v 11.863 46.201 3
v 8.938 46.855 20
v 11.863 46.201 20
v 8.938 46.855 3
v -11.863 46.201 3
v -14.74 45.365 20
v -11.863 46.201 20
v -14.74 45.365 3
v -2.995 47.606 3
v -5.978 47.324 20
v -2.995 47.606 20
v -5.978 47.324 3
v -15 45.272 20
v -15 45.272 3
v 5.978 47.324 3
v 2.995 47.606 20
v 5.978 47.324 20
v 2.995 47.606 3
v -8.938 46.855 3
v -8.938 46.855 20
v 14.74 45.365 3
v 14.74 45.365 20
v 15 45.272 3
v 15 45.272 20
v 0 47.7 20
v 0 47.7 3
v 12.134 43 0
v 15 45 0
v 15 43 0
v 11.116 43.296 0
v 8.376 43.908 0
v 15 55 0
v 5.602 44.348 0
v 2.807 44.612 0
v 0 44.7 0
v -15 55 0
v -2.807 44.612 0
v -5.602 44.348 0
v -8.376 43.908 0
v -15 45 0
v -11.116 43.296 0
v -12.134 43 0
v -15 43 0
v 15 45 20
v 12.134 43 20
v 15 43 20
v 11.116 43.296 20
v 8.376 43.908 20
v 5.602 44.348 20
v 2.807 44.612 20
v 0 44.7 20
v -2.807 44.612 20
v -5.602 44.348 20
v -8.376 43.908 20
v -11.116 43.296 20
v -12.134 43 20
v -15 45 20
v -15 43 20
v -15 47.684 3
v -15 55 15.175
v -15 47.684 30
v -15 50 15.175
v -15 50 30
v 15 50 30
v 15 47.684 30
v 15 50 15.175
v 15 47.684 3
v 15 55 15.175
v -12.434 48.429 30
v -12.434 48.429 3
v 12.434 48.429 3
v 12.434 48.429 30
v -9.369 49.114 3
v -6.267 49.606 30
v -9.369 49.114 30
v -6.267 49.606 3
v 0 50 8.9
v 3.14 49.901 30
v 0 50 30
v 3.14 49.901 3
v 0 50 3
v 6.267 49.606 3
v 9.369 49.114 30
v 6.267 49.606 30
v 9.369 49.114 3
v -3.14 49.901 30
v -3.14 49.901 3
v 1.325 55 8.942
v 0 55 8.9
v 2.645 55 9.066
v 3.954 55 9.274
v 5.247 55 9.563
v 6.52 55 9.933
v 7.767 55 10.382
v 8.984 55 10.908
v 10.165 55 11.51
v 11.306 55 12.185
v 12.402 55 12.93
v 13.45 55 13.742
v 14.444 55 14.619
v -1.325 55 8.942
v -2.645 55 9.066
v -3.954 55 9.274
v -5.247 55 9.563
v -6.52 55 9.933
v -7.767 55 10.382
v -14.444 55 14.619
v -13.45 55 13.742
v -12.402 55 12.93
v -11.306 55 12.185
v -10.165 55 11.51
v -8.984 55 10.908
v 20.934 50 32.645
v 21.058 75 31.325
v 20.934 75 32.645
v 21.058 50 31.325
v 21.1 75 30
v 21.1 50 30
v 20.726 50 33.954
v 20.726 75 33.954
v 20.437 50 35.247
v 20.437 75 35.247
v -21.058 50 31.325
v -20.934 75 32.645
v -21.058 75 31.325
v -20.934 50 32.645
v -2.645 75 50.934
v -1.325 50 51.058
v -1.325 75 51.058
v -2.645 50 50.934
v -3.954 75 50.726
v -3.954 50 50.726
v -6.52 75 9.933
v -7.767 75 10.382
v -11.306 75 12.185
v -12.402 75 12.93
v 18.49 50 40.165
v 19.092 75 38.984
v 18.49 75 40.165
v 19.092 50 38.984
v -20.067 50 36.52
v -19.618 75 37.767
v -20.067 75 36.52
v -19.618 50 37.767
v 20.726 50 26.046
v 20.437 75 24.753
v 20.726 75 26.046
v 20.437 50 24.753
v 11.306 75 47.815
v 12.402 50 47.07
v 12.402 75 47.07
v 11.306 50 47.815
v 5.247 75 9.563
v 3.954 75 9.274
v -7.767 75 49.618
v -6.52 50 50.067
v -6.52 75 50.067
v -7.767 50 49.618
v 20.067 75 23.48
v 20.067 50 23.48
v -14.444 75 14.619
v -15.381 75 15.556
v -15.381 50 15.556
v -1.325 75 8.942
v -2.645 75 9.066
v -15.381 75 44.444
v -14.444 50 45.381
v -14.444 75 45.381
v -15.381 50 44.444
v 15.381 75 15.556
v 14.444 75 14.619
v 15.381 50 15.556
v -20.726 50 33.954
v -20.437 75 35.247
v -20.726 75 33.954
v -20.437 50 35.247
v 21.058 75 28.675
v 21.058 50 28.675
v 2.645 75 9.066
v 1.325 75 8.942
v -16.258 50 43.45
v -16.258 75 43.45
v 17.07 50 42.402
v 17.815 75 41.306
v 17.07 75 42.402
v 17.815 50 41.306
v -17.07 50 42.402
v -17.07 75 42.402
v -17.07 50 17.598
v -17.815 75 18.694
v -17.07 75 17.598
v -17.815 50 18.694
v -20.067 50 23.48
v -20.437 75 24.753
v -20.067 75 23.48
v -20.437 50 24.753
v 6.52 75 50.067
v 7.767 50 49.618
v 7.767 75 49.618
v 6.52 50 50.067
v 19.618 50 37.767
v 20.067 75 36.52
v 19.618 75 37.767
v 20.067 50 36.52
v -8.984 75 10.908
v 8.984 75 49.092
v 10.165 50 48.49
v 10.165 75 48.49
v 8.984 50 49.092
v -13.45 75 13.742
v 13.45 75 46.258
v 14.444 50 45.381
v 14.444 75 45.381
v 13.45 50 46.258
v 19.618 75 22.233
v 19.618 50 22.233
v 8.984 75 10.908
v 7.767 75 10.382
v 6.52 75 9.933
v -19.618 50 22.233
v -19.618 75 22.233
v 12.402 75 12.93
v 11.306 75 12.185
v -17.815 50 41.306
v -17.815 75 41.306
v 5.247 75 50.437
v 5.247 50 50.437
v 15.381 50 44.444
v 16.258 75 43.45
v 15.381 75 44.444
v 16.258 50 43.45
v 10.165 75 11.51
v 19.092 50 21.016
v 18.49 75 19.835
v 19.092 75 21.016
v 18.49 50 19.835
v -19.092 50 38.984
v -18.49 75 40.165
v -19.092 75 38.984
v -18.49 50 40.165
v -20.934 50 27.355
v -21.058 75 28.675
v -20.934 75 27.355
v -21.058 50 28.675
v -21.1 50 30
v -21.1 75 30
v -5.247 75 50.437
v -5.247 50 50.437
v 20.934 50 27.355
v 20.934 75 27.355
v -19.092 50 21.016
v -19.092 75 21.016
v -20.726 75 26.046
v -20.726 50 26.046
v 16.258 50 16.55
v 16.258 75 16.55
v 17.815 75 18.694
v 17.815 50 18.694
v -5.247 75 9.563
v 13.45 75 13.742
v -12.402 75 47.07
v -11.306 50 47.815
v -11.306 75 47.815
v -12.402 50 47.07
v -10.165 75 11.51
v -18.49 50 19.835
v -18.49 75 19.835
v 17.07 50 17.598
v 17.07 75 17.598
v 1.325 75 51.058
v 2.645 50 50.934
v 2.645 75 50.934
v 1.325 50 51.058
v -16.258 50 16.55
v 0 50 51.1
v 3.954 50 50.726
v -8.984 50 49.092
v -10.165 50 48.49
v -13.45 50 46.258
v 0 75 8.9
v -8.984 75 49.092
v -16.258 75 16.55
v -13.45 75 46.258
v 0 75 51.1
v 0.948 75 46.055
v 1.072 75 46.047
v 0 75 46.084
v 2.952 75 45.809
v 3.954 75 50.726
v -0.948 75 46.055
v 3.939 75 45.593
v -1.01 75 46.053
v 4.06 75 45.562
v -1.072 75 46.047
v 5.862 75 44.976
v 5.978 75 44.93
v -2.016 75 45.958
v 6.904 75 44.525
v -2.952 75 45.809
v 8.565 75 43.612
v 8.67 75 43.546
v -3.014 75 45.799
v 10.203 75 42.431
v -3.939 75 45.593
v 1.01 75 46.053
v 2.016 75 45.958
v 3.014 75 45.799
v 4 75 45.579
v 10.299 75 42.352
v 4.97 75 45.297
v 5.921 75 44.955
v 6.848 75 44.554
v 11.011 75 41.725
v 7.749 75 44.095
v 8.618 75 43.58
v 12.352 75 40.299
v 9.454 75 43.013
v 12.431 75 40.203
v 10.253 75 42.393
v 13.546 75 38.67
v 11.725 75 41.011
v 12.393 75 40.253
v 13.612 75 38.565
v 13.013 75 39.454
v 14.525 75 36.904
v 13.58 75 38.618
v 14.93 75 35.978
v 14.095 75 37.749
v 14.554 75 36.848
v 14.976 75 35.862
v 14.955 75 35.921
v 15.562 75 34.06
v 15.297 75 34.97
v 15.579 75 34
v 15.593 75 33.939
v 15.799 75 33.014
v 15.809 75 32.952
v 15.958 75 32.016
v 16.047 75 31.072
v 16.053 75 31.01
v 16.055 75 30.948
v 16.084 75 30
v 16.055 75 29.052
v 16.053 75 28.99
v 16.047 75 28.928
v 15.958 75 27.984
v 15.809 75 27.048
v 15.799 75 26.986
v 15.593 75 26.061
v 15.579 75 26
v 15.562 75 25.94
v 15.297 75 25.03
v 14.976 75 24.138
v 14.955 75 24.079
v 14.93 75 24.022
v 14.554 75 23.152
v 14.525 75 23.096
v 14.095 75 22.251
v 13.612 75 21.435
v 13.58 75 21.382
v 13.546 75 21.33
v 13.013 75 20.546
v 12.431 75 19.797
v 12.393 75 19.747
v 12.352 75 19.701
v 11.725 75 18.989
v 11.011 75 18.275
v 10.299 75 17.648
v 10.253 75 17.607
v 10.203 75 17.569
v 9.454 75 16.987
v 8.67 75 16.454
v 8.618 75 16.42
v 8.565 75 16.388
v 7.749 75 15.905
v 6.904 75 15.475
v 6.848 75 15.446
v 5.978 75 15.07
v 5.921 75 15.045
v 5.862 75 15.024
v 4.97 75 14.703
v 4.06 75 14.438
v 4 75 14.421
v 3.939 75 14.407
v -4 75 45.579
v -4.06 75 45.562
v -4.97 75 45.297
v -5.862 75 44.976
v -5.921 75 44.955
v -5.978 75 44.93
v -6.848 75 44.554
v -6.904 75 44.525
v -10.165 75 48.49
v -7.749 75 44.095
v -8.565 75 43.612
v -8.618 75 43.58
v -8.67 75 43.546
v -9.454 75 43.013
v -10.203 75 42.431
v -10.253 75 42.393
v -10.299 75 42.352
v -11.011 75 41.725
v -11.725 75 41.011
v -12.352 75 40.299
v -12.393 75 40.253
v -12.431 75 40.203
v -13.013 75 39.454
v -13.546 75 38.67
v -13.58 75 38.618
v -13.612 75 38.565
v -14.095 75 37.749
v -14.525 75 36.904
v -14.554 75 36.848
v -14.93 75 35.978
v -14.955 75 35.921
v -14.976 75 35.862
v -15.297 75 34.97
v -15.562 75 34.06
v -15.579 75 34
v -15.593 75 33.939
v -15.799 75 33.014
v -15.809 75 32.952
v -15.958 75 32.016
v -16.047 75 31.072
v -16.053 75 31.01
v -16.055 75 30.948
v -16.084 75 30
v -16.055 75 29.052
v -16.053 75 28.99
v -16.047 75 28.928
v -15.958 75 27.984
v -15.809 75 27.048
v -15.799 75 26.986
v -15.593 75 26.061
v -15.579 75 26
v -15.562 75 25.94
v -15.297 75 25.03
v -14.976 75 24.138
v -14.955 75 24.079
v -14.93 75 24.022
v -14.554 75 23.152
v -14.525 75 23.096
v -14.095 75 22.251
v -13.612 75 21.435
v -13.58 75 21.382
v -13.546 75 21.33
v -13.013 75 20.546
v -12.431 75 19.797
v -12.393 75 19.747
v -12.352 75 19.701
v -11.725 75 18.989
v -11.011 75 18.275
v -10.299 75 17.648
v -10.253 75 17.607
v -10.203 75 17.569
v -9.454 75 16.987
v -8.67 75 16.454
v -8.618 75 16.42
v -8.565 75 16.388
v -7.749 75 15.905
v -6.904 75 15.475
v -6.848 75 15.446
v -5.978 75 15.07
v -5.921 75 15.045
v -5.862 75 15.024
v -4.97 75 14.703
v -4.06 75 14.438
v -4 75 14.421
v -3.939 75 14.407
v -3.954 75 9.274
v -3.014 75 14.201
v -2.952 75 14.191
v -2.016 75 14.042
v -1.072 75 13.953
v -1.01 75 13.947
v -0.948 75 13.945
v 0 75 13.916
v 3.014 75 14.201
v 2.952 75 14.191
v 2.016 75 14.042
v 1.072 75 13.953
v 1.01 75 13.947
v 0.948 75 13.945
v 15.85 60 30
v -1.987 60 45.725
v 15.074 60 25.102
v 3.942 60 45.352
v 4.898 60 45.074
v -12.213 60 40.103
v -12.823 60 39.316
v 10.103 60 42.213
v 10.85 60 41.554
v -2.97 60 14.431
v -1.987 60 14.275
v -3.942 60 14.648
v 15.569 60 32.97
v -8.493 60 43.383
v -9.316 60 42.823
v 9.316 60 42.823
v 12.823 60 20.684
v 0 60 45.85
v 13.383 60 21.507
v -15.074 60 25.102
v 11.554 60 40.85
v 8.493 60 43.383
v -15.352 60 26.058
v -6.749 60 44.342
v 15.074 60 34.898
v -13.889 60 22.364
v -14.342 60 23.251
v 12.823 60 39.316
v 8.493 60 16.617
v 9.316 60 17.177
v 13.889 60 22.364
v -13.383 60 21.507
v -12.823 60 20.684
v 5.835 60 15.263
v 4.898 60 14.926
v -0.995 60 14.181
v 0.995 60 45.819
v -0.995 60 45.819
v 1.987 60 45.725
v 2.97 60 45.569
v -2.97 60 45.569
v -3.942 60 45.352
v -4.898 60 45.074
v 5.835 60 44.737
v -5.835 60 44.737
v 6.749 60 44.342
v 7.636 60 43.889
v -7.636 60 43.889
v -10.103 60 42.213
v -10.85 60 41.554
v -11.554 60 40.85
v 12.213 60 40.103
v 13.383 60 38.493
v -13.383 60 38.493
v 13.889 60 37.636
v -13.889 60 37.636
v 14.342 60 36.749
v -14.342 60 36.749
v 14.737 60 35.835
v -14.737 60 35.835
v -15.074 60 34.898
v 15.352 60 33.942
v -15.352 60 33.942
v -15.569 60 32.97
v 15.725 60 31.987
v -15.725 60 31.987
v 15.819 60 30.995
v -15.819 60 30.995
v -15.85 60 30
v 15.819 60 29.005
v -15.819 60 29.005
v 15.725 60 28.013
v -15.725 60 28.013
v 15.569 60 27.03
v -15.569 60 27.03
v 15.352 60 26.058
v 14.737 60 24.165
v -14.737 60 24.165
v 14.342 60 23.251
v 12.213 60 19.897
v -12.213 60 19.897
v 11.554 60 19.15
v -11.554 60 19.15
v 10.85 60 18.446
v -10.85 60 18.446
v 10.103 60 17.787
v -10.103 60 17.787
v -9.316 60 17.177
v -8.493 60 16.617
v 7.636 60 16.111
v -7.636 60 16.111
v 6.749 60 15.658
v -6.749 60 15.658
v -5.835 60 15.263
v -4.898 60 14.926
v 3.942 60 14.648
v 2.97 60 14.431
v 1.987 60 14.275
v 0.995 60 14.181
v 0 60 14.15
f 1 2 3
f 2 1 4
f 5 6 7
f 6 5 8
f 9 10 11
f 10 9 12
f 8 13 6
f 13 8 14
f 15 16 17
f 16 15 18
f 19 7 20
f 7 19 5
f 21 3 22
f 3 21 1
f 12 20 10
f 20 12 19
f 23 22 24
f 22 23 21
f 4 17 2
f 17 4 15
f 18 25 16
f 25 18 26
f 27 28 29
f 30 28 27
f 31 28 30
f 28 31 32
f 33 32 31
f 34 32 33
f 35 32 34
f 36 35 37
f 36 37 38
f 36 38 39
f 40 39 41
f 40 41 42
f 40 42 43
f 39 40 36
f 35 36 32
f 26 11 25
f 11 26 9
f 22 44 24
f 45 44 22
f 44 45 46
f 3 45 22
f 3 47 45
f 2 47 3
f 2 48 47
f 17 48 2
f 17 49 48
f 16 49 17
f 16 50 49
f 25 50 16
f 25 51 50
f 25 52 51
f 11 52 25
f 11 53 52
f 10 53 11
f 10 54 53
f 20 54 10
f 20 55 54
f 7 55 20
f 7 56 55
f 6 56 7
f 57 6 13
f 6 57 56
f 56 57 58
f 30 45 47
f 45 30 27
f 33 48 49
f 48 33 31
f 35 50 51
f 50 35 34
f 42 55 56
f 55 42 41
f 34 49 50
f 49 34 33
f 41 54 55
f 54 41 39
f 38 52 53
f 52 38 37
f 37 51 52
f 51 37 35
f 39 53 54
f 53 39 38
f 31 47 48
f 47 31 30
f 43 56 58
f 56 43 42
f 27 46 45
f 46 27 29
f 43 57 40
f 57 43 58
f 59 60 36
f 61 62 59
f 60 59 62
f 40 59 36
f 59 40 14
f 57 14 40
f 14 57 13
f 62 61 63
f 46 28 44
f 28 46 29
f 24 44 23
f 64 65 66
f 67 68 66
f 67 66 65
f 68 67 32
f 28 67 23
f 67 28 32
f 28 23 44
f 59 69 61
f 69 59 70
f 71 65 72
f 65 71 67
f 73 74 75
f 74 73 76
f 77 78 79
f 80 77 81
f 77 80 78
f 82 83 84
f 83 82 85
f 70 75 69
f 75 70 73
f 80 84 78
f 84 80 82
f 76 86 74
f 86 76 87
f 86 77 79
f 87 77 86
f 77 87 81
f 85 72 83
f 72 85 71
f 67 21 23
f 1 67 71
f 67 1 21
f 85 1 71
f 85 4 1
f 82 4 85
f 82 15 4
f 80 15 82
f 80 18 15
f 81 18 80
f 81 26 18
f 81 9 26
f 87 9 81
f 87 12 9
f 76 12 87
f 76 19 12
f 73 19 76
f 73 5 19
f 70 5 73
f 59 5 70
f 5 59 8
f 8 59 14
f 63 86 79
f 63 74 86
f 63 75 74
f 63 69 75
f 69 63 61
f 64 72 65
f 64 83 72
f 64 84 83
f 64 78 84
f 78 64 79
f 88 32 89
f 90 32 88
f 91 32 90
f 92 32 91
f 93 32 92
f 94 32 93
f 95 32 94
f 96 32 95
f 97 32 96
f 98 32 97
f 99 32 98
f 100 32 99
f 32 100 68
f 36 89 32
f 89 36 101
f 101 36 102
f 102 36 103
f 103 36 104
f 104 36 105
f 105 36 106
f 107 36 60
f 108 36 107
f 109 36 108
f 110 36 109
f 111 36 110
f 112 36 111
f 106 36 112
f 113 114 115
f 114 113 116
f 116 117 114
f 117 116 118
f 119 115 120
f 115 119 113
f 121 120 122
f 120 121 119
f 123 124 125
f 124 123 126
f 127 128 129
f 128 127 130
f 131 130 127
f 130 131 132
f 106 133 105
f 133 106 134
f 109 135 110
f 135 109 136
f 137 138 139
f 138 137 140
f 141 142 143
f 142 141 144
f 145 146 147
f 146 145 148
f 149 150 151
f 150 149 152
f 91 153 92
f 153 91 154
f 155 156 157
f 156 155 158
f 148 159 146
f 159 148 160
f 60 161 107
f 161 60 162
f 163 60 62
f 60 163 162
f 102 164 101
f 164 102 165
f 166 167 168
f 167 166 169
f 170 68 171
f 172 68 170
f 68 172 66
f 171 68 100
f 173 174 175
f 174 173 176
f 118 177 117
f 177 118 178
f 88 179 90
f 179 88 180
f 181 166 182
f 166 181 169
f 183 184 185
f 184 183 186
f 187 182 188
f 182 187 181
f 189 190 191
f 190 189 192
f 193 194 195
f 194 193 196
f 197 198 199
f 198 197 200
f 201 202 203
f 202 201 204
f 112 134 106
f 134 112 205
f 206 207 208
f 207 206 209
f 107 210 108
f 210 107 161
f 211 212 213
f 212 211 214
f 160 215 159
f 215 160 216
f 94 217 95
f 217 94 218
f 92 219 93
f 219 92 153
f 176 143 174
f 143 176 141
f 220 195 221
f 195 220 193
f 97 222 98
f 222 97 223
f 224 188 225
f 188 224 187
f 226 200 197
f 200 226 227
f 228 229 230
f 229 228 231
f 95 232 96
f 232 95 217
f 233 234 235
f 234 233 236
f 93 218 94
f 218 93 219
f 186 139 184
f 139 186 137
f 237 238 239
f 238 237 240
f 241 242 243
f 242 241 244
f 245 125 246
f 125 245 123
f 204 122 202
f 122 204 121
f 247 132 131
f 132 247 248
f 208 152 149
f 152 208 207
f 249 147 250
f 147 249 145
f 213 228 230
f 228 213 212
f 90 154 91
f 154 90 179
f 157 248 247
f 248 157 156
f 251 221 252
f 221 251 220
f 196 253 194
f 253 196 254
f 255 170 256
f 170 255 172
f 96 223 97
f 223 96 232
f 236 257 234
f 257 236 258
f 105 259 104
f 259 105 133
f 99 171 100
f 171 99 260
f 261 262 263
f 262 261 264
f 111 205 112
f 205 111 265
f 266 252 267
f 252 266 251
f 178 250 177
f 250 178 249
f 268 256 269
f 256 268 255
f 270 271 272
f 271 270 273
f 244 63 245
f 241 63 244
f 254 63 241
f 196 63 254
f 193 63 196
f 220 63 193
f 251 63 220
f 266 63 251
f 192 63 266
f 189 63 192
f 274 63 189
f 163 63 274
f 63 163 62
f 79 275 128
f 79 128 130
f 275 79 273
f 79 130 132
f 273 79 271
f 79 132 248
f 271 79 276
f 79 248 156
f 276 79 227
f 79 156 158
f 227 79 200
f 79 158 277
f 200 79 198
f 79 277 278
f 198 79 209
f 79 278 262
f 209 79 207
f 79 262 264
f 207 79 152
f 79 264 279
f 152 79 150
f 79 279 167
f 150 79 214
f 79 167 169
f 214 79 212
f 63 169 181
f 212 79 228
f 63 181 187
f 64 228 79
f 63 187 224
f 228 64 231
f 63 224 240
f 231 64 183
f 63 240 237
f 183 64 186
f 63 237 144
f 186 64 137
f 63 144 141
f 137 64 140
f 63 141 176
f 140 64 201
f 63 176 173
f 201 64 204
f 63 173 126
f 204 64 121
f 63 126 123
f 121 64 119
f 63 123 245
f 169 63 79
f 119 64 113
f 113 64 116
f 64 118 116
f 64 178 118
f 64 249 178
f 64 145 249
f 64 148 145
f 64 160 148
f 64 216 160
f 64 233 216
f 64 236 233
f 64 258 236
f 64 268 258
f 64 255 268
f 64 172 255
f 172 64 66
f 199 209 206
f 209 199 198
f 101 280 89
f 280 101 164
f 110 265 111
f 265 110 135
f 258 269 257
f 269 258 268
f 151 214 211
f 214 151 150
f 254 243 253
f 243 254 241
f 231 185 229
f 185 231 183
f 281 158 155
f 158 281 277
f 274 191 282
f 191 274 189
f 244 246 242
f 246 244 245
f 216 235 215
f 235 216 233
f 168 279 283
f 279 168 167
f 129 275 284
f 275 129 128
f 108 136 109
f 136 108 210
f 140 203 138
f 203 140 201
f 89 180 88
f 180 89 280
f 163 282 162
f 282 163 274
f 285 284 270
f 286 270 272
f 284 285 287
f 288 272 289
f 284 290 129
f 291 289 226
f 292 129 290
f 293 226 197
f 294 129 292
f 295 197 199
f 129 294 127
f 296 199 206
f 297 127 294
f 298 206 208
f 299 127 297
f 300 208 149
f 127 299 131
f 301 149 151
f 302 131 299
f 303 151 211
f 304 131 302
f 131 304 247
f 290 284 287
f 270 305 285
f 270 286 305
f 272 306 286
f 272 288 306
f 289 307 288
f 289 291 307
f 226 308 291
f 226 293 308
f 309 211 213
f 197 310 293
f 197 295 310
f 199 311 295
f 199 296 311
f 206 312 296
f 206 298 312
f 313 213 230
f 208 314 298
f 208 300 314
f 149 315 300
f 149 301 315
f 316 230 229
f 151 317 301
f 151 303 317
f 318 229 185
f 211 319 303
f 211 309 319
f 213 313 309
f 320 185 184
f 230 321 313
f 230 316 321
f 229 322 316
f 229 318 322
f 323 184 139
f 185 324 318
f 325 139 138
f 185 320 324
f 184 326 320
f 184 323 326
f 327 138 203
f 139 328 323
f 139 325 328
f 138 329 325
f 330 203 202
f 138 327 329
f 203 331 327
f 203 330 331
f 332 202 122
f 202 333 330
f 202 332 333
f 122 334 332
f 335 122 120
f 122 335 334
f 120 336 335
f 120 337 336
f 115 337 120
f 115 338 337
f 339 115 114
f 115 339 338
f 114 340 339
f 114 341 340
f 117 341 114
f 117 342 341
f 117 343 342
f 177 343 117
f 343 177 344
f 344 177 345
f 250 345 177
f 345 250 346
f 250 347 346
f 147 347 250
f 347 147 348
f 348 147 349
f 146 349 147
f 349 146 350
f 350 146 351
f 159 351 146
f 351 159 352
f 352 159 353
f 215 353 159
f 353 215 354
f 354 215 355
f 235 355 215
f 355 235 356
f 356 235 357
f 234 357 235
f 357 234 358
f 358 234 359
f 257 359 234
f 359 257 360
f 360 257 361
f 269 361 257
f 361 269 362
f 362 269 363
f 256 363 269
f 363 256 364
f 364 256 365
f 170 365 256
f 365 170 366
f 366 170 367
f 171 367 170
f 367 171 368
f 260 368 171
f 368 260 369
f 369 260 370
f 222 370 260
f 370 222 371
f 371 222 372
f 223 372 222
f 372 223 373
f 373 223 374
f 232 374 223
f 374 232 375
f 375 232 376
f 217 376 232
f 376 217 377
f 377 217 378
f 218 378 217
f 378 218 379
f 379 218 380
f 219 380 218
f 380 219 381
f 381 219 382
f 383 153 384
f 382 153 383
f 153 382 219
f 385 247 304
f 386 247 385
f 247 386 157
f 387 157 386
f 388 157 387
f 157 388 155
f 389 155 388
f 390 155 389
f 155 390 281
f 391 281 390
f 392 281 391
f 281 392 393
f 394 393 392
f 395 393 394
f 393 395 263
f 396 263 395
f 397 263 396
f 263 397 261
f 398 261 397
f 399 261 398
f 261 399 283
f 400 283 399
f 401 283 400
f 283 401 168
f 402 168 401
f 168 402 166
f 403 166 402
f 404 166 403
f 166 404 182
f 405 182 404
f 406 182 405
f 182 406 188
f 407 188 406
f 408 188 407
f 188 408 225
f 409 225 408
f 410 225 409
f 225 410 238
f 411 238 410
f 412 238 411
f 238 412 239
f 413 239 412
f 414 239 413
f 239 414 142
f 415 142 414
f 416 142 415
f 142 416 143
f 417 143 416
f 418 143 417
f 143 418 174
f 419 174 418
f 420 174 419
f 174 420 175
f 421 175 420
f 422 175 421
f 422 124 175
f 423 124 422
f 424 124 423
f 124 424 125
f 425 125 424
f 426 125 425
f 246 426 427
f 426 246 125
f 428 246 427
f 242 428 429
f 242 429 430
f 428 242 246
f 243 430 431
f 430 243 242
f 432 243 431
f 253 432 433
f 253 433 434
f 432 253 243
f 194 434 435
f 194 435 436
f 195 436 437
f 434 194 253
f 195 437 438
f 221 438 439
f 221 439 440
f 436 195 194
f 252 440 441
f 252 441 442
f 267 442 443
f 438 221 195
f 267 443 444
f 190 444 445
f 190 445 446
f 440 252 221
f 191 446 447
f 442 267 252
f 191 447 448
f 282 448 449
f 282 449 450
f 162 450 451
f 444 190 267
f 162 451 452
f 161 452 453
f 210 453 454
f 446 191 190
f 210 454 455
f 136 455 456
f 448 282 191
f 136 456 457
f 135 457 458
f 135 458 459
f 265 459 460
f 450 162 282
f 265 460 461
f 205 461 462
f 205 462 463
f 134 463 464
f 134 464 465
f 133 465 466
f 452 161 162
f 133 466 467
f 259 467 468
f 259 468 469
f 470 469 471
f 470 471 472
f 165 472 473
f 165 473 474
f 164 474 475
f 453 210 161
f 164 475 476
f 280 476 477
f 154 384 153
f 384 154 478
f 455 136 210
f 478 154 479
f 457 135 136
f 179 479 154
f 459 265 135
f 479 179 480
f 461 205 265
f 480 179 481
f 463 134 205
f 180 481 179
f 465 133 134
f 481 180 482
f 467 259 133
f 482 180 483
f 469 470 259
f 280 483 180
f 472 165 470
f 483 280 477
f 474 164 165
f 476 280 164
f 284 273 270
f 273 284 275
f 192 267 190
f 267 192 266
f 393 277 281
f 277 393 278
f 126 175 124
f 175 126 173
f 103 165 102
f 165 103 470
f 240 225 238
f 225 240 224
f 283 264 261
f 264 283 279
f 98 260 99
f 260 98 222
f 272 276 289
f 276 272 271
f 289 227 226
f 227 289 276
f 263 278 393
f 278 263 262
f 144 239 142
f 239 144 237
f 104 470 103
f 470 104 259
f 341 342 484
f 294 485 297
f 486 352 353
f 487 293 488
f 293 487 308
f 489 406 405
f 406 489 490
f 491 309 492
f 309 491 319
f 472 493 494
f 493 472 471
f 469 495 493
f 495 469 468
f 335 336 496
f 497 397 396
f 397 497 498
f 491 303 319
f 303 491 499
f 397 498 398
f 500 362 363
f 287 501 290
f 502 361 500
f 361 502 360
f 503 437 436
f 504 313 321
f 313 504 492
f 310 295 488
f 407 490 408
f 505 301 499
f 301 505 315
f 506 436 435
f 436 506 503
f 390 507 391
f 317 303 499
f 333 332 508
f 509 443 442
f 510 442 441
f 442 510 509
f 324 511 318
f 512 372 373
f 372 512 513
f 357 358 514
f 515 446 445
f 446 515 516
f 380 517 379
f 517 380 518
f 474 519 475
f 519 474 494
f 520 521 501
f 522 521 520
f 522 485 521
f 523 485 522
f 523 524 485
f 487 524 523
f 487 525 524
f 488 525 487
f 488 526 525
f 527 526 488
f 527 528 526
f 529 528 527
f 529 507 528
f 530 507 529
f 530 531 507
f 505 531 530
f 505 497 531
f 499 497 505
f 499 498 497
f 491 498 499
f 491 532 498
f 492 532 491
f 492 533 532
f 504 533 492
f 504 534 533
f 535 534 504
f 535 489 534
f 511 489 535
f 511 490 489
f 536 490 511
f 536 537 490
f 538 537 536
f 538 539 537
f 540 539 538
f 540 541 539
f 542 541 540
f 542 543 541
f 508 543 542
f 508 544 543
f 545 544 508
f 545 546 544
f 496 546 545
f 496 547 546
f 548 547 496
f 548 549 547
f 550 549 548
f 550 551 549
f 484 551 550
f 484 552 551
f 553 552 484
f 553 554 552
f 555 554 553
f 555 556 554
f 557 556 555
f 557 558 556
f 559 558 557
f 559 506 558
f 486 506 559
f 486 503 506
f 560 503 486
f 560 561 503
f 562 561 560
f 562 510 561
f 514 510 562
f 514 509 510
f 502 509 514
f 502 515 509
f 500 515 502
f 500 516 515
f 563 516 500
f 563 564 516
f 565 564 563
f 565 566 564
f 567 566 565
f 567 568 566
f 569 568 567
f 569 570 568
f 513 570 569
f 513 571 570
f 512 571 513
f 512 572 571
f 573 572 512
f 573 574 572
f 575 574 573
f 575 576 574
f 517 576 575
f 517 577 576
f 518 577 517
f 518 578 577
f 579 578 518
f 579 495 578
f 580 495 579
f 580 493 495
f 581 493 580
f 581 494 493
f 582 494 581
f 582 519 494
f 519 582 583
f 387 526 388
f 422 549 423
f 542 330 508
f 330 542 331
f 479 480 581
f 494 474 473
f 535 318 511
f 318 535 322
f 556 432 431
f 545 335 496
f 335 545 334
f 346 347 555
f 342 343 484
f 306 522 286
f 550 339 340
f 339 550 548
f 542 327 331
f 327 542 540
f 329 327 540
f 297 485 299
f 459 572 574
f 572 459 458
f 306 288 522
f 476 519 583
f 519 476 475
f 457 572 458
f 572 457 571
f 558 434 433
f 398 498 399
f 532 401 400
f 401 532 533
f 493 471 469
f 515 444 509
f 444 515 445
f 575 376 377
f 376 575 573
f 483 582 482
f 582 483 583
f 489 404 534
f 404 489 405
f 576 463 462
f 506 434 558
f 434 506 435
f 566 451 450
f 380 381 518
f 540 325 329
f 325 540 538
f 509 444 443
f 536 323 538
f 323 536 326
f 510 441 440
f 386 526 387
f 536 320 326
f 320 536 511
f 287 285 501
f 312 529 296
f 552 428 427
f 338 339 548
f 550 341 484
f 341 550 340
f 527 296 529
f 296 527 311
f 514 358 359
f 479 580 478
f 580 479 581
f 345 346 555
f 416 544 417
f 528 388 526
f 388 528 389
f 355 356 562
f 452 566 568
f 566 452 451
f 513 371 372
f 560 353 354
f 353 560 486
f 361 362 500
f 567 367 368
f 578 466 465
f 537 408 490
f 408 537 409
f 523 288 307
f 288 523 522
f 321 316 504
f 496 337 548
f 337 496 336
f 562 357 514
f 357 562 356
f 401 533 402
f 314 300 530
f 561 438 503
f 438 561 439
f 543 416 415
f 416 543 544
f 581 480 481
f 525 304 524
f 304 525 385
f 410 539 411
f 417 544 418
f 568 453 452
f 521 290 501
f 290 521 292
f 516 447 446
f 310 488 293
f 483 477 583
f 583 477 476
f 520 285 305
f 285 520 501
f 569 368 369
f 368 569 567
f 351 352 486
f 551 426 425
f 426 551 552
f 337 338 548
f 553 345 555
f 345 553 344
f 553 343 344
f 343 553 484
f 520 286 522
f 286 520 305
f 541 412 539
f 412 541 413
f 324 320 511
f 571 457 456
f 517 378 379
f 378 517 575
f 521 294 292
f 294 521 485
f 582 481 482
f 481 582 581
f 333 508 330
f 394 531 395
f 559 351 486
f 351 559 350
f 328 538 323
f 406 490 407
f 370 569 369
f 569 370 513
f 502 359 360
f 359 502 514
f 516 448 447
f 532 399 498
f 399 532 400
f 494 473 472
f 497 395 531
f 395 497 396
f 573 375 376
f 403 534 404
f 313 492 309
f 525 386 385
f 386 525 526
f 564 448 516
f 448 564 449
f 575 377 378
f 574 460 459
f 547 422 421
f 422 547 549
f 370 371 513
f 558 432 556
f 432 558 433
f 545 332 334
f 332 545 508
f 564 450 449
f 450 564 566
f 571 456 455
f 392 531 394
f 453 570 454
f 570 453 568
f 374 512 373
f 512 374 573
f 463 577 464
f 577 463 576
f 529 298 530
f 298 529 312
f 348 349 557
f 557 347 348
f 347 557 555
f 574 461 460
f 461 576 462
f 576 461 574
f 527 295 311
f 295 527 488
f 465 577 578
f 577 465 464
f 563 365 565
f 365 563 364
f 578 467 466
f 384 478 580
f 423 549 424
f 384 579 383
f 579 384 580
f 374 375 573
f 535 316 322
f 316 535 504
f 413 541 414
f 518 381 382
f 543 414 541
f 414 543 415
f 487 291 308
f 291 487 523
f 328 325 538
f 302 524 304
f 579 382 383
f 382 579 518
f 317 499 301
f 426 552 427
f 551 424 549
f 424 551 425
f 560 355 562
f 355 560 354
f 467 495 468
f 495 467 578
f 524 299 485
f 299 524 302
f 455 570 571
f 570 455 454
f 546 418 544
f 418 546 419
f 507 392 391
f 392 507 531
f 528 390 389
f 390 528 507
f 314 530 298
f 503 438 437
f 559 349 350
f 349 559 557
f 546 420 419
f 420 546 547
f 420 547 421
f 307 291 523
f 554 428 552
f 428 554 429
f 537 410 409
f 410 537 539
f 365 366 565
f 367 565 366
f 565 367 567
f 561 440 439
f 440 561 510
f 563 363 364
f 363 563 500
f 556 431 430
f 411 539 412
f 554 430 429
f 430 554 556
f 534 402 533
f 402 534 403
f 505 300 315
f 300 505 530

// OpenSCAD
// rain gauge upper cover clamp stabilizer



$fn=100;

PR=16.10; //enter pvc pipe radius here (for standard 1" PVC, PR=16.90; for 32mm PR=16.2)

//hose clamp rim
difference(){
    cylinder (20,47.7,47.7); 
    translate([0,0,-1]) cylinder(50,44.7,44.7); 
    translate([-70,-157,-5]) cube([200,200,200]); 
    translate([-35,0,-5]) cube([20,60,50]);
    translate([15,0,-5]) cube([20,60,50]);
    }

//hose clamp slot
difference () {
    translate([-15,45,0]) cube([30,10,30]);
    translate ([0,0,3]) difference(){
        cylinder(44,50,50); 
        translate([0,0,-1]) cylinder(50,47.7,47.7); 
        }
    translate ([0,0,20]) cylinder(44,50,50); 
}

//pipe socket
translate([0,75,30]) rotate([90,0,0]) difference(){
    cylinder(25,PR+5,PR+5); 
    translate([0,0,-1]) cylinder(16,PR,PR-0.25);
    } 
